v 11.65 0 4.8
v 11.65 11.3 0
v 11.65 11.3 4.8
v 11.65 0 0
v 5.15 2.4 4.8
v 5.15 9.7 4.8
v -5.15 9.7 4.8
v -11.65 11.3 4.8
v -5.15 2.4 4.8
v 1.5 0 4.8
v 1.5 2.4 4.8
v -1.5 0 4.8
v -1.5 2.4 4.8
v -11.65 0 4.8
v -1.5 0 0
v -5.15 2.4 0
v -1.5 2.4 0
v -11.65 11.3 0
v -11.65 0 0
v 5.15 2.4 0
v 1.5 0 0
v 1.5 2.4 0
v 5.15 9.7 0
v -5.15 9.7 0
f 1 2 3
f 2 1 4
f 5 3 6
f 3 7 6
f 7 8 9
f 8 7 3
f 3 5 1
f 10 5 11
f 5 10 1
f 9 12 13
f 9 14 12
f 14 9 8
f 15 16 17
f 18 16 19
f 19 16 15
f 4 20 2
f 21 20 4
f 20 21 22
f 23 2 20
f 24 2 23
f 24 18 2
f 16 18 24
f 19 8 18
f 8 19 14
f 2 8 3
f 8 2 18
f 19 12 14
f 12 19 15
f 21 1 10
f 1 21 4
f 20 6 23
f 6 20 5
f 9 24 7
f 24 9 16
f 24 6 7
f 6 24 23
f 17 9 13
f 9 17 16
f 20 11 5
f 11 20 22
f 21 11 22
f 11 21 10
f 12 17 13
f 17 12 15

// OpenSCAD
// USB plug width
uW = 10.3;

// USB plug depth
uD = 7.3;

// Separation from phone back
uS = 2.4;


/* [ Hidden ] */
fH= 3;

wF = 23.3;
dF = 11.3;
hF = 4.8;


difference() {
translate ([-wF/2, 0, 0])
cube([wF, dF, hF]);
translate([-uW/2, uS, -1])
cube ([uW, uD, hF+2]);
translate([-fH/2, -1, -1])
cube([fH, uS+2, hF+2]);
}



